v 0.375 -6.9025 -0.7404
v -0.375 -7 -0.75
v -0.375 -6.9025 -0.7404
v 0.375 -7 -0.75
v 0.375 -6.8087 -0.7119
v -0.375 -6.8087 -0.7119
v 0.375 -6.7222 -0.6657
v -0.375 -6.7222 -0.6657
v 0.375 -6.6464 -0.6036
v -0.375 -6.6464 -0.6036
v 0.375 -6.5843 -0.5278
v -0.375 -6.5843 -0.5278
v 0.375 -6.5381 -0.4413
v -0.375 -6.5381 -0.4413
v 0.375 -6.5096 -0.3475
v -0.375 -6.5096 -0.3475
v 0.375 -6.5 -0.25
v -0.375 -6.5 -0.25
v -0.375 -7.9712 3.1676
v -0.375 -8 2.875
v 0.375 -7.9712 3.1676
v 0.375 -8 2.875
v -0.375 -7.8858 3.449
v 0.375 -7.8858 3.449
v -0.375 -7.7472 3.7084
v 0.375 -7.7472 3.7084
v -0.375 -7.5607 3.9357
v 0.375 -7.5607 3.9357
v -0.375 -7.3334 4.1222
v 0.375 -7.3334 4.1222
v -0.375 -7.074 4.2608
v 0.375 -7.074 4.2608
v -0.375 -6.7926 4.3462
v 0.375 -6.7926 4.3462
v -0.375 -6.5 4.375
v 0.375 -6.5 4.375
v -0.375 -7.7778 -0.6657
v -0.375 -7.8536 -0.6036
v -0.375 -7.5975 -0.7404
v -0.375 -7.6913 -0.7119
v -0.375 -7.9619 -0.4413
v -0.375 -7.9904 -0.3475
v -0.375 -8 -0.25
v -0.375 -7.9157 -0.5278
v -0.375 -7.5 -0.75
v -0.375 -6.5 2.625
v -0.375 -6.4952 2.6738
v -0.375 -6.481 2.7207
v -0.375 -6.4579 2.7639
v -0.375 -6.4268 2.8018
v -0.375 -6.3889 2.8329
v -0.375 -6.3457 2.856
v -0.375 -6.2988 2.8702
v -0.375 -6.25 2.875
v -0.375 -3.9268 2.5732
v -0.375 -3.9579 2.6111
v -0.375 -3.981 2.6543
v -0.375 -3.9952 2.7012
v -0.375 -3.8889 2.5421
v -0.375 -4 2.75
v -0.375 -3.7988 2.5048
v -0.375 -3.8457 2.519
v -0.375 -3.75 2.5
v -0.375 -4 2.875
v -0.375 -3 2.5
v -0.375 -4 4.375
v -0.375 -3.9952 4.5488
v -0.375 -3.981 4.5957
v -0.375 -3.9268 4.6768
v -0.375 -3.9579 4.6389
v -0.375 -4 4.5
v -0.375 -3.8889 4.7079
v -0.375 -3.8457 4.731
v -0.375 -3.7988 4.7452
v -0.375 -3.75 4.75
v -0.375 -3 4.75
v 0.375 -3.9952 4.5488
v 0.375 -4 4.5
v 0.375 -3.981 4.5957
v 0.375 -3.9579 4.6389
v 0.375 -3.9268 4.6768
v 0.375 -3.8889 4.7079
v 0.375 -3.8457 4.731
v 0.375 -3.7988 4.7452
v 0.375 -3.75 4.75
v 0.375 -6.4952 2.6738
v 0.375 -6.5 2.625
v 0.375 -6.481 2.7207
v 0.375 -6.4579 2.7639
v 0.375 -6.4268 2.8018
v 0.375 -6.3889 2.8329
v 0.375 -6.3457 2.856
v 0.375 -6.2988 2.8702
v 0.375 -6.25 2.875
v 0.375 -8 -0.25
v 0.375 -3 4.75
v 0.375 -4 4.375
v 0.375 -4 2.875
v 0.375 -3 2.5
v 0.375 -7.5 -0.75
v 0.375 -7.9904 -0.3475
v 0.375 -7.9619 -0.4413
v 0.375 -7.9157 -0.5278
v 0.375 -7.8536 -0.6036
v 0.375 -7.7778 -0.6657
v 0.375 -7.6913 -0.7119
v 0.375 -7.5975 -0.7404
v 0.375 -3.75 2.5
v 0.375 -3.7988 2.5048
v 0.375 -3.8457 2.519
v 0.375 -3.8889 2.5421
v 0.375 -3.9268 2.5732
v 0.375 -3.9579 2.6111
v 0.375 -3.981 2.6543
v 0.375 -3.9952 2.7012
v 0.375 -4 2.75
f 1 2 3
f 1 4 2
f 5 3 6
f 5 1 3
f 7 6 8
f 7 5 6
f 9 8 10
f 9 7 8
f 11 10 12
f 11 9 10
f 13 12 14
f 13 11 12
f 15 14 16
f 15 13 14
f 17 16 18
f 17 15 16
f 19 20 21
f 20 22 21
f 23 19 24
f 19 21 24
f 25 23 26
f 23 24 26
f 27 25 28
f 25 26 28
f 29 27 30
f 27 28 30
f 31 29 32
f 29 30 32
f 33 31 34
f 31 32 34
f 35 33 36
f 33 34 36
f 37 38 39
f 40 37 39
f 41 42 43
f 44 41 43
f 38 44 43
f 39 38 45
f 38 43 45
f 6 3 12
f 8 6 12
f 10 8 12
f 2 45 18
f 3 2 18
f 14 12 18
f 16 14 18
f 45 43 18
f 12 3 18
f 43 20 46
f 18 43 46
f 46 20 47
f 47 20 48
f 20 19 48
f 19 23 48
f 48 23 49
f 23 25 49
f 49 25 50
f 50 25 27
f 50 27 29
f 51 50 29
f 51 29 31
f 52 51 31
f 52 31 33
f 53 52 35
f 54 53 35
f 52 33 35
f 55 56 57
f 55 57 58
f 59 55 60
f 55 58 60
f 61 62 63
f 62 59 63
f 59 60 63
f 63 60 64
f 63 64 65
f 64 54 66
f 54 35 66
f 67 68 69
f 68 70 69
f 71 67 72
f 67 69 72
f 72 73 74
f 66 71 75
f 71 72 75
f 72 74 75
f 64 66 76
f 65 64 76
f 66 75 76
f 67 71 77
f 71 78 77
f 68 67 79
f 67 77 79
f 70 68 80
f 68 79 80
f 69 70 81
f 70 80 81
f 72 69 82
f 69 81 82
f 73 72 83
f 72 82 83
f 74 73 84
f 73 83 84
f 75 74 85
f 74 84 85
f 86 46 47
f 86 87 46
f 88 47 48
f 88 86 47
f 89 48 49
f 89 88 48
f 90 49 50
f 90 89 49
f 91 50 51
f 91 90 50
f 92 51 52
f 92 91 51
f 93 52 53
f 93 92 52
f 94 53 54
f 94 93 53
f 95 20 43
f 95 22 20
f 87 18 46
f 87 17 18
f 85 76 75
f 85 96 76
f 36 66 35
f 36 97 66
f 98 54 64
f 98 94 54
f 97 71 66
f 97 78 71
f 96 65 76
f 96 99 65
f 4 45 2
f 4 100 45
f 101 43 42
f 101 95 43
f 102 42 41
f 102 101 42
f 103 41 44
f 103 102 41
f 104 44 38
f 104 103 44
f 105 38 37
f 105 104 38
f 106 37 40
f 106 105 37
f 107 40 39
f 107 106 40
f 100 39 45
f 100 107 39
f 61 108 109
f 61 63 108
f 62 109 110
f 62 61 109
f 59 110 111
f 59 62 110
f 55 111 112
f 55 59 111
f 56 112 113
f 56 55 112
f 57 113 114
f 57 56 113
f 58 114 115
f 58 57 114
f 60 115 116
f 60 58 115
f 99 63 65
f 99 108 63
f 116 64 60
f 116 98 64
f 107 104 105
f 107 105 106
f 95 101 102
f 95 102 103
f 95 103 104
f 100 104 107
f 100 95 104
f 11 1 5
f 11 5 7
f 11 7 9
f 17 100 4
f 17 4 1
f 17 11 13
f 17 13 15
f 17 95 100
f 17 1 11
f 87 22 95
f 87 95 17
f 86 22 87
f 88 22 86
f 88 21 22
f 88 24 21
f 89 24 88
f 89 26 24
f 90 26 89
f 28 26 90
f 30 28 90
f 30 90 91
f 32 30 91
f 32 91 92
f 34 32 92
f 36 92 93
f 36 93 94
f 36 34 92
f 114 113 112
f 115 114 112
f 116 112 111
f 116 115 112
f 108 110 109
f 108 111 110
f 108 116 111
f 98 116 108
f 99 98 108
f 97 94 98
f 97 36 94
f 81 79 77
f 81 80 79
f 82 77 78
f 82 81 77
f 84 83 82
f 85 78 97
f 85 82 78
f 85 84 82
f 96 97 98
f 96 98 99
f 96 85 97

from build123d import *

# Parameters (mm, degrees)
PAD003_DEPTH = 0.375
FILLET001_R  = 1.5
FILLET002_R  = 0.25
FILLET003_R  = 0.5


with BuildPart() as part:
    # Sketch007 → Pad003 (new body, symmetric)
    with BuildSketch(Plane.YZ):
        Polygon((-3, 4.75), (-4, 4.75), (-4, 4.375), (-8, 4.375), (-8, -0.75), (-6.5, -0.75), (-6.5, 2.875), (-4, 2.875), (-4, 2.5), (-3, 2.5), align=None)
    extrude(amount=PAD003_DEPTH, both=True)

    # Fillet001
    fillet001_edges = [part.edges().sort_by_distance(p)[0] for p in [
        (0, -8, 4.375),
    ]]
    fillet(fillet001_edges, radius=FILLET001_R)

    # Fillet002
    fillet002_edges = [part.edges().sort_by_distance(p)[0] for p in [
        (0, -4, 4.75),
        (0, -4, 2.5),
        (0, -6.5, 2.875),
    ]]
    fillet(fillet002_edges, radius=FILLET002_R)

    # Fillet003
    fillet003_edges = [part.edges().sort_by_distance(p)[0] for p in [
        (0, -8, -0.75),
        (0, -6.5, -0.75),
    ]]
    fillet(fillet003_edges, radius=FILLET003_R)


solid = part.part
